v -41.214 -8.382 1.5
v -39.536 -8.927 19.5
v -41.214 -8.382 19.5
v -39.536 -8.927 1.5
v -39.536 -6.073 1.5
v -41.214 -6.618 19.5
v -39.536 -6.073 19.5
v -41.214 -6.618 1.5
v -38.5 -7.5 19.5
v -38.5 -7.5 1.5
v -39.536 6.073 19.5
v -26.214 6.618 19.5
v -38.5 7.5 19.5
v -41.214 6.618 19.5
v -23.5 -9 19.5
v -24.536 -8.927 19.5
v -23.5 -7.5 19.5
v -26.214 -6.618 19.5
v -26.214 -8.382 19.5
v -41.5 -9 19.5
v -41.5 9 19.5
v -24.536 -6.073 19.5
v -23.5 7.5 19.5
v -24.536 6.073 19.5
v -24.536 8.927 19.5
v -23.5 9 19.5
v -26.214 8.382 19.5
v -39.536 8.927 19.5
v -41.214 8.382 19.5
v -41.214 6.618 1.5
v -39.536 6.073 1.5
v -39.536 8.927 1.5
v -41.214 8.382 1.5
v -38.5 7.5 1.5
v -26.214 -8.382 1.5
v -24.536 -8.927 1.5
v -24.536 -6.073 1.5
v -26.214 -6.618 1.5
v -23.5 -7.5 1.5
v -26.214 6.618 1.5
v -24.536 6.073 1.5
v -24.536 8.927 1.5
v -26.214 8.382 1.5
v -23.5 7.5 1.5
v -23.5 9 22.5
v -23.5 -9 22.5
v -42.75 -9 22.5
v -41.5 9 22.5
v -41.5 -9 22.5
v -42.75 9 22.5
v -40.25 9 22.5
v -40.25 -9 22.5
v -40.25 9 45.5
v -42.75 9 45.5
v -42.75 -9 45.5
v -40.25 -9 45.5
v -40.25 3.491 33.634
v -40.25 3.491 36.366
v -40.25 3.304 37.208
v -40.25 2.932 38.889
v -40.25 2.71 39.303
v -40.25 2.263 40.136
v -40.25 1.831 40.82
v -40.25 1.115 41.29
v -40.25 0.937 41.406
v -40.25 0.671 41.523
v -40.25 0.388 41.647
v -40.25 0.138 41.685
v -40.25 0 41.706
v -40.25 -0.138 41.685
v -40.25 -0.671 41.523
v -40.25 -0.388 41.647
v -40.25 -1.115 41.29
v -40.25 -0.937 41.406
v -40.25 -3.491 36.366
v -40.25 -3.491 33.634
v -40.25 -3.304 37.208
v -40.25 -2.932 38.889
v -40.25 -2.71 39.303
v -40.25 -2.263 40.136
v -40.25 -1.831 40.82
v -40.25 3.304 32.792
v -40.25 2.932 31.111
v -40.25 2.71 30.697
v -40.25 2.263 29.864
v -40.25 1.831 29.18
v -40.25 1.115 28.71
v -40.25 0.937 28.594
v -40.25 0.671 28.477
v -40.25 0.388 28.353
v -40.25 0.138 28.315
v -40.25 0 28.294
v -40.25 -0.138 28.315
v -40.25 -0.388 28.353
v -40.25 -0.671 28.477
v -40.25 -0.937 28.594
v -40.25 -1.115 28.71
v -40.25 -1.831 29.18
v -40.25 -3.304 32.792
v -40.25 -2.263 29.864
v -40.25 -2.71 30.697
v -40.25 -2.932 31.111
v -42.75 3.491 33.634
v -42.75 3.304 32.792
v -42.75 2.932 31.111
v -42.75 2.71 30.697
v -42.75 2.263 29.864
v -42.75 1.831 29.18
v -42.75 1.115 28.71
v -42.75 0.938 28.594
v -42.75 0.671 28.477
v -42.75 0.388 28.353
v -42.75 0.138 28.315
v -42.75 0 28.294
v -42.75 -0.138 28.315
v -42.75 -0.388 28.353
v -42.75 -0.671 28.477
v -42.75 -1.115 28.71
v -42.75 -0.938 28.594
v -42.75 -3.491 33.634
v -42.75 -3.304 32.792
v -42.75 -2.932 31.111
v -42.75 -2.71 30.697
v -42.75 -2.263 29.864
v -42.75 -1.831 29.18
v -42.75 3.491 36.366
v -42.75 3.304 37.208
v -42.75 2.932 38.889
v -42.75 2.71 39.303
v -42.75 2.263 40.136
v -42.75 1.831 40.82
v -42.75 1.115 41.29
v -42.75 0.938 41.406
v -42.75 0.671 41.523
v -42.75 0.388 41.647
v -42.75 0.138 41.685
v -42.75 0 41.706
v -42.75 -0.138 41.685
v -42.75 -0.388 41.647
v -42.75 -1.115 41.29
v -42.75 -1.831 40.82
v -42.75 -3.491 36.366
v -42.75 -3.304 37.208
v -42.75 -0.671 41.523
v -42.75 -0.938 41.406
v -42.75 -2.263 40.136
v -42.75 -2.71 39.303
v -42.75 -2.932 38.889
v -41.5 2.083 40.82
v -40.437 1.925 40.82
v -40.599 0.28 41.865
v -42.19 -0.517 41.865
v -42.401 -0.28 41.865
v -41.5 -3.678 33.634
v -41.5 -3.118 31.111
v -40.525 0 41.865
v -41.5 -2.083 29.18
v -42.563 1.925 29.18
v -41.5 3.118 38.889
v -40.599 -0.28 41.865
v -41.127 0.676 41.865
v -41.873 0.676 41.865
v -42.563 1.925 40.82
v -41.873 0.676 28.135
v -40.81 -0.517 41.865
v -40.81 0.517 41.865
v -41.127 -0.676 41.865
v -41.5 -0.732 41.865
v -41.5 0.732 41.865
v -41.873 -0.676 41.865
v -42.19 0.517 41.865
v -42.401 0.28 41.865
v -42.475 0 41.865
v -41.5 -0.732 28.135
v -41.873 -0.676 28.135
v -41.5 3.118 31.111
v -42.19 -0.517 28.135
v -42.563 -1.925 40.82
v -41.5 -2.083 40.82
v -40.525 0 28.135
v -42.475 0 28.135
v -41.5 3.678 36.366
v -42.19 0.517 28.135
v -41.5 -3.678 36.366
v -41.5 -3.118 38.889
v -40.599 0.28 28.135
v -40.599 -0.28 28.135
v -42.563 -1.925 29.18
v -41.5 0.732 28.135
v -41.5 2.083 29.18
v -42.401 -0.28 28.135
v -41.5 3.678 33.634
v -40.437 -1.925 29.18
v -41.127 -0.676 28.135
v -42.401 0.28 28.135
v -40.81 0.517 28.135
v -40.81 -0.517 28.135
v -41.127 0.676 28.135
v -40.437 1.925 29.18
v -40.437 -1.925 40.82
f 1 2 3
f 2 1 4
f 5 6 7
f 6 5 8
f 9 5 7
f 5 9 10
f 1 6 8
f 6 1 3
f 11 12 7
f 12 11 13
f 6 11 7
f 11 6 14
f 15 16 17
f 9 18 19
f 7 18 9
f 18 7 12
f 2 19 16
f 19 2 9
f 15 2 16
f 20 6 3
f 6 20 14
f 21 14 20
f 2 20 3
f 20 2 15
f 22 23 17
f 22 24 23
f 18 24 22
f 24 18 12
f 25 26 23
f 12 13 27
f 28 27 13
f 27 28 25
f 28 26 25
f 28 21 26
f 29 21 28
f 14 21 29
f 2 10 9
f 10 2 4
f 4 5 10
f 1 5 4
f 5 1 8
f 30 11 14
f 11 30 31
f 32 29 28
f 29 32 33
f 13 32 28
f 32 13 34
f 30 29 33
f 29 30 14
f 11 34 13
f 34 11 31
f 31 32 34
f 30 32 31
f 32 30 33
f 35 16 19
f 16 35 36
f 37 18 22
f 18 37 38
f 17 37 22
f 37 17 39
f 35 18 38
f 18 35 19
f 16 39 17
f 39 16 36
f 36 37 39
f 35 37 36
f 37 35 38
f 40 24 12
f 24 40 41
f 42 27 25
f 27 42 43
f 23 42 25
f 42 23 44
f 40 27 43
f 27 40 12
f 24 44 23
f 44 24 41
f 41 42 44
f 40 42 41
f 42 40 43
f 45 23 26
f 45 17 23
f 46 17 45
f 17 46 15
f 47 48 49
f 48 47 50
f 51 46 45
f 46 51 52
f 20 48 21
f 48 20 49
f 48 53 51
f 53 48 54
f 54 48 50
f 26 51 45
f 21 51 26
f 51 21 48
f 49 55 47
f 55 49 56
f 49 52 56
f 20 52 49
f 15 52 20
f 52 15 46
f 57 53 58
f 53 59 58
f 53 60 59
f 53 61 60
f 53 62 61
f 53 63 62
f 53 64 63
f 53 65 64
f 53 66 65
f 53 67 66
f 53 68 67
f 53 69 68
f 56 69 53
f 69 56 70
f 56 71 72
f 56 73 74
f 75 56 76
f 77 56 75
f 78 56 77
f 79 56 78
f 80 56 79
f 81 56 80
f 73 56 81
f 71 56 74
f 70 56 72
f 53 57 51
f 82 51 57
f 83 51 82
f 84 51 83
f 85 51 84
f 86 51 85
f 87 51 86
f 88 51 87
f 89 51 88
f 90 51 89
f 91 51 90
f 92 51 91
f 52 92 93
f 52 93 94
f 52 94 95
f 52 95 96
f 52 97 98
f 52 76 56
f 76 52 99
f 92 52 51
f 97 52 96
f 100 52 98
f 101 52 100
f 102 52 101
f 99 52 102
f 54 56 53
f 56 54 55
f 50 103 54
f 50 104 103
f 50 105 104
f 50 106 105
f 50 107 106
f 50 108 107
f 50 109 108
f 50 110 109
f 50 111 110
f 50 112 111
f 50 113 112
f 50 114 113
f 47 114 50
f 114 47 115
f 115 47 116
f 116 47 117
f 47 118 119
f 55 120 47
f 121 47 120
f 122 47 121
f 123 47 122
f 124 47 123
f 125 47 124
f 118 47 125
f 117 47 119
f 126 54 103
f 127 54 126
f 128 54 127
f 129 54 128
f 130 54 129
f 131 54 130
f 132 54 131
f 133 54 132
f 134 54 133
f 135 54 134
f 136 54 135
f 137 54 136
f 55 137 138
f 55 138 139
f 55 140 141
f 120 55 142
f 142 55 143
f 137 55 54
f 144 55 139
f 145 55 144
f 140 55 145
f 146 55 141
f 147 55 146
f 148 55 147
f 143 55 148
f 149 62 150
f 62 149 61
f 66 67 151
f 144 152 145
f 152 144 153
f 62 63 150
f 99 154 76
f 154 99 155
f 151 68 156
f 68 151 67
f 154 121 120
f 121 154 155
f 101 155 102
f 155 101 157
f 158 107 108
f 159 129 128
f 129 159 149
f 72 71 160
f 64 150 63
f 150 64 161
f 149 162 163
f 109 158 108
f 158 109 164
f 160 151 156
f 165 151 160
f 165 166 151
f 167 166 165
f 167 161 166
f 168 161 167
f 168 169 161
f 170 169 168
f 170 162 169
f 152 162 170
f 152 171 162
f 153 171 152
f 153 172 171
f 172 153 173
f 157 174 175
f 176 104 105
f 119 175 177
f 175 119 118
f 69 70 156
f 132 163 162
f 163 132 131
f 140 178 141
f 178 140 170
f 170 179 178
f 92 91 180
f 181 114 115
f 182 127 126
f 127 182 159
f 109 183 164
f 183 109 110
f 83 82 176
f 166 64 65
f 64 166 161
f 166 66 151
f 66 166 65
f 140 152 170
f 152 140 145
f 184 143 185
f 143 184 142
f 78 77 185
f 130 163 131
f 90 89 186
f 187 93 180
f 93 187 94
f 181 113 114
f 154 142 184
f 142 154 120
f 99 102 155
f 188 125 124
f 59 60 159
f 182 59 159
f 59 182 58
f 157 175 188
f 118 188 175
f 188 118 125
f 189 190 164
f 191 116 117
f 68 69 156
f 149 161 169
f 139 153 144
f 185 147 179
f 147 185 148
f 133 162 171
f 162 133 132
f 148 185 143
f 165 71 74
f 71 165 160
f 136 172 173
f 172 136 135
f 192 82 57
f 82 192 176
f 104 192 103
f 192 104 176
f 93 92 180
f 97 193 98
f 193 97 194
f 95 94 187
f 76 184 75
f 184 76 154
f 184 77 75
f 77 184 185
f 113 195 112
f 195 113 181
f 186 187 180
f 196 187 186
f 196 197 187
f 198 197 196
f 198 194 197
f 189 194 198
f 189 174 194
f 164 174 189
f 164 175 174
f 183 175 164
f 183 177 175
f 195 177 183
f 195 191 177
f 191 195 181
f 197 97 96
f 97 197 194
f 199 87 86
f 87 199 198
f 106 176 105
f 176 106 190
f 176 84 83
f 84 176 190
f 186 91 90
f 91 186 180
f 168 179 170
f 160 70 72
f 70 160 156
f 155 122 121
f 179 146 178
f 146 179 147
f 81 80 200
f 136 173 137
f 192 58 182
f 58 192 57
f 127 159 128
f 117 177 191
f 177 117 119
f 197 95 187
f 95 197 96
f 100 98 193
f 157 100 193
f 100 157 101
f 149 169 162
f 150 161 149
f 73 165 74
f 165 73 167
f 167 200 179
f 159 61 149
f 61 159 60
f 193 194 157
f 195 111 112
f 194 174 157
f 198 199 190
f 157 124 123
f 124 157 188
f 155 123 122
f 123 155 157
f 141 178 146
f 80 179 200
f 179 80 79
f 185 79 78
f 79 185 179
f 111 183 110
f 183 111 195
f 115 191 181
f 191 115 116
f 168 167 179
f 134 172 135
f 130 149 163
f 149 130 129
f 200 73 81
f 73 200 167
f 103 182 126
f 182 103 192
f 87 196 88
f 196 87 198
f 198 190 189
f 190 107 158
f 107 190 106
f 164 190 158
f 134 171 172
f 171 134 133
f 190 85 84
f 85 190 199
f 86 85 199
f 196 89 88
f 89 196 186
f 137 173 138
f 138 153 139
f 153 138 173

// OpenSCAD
module piso()
{
    cube([100,100,3], center=true);
}

module mesa()
{
    //30 pulgadas es el tamano normal de un mesa
    //primer pierna
    translate([-20,-20,1.5])cylinder(h=30,r=1.5);
    //segunda pierna
    translate([-20,20,1.5])cylinder(h=30,r=1.5);
    //tercera pierna
    translate([20,-20,1.5])cylinder(h=30,r=1.5);
    //cuarta pierna
    translate([20,20,1.5])cylinder(h=30,r=1.5);
    
    //tapa de la mesa
    //altura mitad piso(z) + mitad mesa(z) + altura pata
    translate([0,0,33])cube([45,45,3],center=true);
}

module sillaBase()
{
    translate([-40,-7.5,1.5])cylinder(h=18,r=1.5);
    
    translate([-40,7.5,1.5])cylinder(h=18,r=1.5);
    
    translate([-25,-7.5,1.5])cylinder(h=18,r=1.5);
    
    translate([-25,7.5,1.5])cylinder(h=18,r=1.5);
    
    //altura mitad piso(z) + mitad mesa(z) + altura pata
    translate([-32.5,0,21])cube([18,18,3],center=true);
}

module espaldar()
{
    difference(){
    translate([-41.5,0,34])cube([2.5,18,23],center=true);
    translate([-41.5,0,35])scale([1,.75,1.4])sphere(5);     
    }
}

module silla()
{
        sillaBase();
        espaldar();
}

silla();
